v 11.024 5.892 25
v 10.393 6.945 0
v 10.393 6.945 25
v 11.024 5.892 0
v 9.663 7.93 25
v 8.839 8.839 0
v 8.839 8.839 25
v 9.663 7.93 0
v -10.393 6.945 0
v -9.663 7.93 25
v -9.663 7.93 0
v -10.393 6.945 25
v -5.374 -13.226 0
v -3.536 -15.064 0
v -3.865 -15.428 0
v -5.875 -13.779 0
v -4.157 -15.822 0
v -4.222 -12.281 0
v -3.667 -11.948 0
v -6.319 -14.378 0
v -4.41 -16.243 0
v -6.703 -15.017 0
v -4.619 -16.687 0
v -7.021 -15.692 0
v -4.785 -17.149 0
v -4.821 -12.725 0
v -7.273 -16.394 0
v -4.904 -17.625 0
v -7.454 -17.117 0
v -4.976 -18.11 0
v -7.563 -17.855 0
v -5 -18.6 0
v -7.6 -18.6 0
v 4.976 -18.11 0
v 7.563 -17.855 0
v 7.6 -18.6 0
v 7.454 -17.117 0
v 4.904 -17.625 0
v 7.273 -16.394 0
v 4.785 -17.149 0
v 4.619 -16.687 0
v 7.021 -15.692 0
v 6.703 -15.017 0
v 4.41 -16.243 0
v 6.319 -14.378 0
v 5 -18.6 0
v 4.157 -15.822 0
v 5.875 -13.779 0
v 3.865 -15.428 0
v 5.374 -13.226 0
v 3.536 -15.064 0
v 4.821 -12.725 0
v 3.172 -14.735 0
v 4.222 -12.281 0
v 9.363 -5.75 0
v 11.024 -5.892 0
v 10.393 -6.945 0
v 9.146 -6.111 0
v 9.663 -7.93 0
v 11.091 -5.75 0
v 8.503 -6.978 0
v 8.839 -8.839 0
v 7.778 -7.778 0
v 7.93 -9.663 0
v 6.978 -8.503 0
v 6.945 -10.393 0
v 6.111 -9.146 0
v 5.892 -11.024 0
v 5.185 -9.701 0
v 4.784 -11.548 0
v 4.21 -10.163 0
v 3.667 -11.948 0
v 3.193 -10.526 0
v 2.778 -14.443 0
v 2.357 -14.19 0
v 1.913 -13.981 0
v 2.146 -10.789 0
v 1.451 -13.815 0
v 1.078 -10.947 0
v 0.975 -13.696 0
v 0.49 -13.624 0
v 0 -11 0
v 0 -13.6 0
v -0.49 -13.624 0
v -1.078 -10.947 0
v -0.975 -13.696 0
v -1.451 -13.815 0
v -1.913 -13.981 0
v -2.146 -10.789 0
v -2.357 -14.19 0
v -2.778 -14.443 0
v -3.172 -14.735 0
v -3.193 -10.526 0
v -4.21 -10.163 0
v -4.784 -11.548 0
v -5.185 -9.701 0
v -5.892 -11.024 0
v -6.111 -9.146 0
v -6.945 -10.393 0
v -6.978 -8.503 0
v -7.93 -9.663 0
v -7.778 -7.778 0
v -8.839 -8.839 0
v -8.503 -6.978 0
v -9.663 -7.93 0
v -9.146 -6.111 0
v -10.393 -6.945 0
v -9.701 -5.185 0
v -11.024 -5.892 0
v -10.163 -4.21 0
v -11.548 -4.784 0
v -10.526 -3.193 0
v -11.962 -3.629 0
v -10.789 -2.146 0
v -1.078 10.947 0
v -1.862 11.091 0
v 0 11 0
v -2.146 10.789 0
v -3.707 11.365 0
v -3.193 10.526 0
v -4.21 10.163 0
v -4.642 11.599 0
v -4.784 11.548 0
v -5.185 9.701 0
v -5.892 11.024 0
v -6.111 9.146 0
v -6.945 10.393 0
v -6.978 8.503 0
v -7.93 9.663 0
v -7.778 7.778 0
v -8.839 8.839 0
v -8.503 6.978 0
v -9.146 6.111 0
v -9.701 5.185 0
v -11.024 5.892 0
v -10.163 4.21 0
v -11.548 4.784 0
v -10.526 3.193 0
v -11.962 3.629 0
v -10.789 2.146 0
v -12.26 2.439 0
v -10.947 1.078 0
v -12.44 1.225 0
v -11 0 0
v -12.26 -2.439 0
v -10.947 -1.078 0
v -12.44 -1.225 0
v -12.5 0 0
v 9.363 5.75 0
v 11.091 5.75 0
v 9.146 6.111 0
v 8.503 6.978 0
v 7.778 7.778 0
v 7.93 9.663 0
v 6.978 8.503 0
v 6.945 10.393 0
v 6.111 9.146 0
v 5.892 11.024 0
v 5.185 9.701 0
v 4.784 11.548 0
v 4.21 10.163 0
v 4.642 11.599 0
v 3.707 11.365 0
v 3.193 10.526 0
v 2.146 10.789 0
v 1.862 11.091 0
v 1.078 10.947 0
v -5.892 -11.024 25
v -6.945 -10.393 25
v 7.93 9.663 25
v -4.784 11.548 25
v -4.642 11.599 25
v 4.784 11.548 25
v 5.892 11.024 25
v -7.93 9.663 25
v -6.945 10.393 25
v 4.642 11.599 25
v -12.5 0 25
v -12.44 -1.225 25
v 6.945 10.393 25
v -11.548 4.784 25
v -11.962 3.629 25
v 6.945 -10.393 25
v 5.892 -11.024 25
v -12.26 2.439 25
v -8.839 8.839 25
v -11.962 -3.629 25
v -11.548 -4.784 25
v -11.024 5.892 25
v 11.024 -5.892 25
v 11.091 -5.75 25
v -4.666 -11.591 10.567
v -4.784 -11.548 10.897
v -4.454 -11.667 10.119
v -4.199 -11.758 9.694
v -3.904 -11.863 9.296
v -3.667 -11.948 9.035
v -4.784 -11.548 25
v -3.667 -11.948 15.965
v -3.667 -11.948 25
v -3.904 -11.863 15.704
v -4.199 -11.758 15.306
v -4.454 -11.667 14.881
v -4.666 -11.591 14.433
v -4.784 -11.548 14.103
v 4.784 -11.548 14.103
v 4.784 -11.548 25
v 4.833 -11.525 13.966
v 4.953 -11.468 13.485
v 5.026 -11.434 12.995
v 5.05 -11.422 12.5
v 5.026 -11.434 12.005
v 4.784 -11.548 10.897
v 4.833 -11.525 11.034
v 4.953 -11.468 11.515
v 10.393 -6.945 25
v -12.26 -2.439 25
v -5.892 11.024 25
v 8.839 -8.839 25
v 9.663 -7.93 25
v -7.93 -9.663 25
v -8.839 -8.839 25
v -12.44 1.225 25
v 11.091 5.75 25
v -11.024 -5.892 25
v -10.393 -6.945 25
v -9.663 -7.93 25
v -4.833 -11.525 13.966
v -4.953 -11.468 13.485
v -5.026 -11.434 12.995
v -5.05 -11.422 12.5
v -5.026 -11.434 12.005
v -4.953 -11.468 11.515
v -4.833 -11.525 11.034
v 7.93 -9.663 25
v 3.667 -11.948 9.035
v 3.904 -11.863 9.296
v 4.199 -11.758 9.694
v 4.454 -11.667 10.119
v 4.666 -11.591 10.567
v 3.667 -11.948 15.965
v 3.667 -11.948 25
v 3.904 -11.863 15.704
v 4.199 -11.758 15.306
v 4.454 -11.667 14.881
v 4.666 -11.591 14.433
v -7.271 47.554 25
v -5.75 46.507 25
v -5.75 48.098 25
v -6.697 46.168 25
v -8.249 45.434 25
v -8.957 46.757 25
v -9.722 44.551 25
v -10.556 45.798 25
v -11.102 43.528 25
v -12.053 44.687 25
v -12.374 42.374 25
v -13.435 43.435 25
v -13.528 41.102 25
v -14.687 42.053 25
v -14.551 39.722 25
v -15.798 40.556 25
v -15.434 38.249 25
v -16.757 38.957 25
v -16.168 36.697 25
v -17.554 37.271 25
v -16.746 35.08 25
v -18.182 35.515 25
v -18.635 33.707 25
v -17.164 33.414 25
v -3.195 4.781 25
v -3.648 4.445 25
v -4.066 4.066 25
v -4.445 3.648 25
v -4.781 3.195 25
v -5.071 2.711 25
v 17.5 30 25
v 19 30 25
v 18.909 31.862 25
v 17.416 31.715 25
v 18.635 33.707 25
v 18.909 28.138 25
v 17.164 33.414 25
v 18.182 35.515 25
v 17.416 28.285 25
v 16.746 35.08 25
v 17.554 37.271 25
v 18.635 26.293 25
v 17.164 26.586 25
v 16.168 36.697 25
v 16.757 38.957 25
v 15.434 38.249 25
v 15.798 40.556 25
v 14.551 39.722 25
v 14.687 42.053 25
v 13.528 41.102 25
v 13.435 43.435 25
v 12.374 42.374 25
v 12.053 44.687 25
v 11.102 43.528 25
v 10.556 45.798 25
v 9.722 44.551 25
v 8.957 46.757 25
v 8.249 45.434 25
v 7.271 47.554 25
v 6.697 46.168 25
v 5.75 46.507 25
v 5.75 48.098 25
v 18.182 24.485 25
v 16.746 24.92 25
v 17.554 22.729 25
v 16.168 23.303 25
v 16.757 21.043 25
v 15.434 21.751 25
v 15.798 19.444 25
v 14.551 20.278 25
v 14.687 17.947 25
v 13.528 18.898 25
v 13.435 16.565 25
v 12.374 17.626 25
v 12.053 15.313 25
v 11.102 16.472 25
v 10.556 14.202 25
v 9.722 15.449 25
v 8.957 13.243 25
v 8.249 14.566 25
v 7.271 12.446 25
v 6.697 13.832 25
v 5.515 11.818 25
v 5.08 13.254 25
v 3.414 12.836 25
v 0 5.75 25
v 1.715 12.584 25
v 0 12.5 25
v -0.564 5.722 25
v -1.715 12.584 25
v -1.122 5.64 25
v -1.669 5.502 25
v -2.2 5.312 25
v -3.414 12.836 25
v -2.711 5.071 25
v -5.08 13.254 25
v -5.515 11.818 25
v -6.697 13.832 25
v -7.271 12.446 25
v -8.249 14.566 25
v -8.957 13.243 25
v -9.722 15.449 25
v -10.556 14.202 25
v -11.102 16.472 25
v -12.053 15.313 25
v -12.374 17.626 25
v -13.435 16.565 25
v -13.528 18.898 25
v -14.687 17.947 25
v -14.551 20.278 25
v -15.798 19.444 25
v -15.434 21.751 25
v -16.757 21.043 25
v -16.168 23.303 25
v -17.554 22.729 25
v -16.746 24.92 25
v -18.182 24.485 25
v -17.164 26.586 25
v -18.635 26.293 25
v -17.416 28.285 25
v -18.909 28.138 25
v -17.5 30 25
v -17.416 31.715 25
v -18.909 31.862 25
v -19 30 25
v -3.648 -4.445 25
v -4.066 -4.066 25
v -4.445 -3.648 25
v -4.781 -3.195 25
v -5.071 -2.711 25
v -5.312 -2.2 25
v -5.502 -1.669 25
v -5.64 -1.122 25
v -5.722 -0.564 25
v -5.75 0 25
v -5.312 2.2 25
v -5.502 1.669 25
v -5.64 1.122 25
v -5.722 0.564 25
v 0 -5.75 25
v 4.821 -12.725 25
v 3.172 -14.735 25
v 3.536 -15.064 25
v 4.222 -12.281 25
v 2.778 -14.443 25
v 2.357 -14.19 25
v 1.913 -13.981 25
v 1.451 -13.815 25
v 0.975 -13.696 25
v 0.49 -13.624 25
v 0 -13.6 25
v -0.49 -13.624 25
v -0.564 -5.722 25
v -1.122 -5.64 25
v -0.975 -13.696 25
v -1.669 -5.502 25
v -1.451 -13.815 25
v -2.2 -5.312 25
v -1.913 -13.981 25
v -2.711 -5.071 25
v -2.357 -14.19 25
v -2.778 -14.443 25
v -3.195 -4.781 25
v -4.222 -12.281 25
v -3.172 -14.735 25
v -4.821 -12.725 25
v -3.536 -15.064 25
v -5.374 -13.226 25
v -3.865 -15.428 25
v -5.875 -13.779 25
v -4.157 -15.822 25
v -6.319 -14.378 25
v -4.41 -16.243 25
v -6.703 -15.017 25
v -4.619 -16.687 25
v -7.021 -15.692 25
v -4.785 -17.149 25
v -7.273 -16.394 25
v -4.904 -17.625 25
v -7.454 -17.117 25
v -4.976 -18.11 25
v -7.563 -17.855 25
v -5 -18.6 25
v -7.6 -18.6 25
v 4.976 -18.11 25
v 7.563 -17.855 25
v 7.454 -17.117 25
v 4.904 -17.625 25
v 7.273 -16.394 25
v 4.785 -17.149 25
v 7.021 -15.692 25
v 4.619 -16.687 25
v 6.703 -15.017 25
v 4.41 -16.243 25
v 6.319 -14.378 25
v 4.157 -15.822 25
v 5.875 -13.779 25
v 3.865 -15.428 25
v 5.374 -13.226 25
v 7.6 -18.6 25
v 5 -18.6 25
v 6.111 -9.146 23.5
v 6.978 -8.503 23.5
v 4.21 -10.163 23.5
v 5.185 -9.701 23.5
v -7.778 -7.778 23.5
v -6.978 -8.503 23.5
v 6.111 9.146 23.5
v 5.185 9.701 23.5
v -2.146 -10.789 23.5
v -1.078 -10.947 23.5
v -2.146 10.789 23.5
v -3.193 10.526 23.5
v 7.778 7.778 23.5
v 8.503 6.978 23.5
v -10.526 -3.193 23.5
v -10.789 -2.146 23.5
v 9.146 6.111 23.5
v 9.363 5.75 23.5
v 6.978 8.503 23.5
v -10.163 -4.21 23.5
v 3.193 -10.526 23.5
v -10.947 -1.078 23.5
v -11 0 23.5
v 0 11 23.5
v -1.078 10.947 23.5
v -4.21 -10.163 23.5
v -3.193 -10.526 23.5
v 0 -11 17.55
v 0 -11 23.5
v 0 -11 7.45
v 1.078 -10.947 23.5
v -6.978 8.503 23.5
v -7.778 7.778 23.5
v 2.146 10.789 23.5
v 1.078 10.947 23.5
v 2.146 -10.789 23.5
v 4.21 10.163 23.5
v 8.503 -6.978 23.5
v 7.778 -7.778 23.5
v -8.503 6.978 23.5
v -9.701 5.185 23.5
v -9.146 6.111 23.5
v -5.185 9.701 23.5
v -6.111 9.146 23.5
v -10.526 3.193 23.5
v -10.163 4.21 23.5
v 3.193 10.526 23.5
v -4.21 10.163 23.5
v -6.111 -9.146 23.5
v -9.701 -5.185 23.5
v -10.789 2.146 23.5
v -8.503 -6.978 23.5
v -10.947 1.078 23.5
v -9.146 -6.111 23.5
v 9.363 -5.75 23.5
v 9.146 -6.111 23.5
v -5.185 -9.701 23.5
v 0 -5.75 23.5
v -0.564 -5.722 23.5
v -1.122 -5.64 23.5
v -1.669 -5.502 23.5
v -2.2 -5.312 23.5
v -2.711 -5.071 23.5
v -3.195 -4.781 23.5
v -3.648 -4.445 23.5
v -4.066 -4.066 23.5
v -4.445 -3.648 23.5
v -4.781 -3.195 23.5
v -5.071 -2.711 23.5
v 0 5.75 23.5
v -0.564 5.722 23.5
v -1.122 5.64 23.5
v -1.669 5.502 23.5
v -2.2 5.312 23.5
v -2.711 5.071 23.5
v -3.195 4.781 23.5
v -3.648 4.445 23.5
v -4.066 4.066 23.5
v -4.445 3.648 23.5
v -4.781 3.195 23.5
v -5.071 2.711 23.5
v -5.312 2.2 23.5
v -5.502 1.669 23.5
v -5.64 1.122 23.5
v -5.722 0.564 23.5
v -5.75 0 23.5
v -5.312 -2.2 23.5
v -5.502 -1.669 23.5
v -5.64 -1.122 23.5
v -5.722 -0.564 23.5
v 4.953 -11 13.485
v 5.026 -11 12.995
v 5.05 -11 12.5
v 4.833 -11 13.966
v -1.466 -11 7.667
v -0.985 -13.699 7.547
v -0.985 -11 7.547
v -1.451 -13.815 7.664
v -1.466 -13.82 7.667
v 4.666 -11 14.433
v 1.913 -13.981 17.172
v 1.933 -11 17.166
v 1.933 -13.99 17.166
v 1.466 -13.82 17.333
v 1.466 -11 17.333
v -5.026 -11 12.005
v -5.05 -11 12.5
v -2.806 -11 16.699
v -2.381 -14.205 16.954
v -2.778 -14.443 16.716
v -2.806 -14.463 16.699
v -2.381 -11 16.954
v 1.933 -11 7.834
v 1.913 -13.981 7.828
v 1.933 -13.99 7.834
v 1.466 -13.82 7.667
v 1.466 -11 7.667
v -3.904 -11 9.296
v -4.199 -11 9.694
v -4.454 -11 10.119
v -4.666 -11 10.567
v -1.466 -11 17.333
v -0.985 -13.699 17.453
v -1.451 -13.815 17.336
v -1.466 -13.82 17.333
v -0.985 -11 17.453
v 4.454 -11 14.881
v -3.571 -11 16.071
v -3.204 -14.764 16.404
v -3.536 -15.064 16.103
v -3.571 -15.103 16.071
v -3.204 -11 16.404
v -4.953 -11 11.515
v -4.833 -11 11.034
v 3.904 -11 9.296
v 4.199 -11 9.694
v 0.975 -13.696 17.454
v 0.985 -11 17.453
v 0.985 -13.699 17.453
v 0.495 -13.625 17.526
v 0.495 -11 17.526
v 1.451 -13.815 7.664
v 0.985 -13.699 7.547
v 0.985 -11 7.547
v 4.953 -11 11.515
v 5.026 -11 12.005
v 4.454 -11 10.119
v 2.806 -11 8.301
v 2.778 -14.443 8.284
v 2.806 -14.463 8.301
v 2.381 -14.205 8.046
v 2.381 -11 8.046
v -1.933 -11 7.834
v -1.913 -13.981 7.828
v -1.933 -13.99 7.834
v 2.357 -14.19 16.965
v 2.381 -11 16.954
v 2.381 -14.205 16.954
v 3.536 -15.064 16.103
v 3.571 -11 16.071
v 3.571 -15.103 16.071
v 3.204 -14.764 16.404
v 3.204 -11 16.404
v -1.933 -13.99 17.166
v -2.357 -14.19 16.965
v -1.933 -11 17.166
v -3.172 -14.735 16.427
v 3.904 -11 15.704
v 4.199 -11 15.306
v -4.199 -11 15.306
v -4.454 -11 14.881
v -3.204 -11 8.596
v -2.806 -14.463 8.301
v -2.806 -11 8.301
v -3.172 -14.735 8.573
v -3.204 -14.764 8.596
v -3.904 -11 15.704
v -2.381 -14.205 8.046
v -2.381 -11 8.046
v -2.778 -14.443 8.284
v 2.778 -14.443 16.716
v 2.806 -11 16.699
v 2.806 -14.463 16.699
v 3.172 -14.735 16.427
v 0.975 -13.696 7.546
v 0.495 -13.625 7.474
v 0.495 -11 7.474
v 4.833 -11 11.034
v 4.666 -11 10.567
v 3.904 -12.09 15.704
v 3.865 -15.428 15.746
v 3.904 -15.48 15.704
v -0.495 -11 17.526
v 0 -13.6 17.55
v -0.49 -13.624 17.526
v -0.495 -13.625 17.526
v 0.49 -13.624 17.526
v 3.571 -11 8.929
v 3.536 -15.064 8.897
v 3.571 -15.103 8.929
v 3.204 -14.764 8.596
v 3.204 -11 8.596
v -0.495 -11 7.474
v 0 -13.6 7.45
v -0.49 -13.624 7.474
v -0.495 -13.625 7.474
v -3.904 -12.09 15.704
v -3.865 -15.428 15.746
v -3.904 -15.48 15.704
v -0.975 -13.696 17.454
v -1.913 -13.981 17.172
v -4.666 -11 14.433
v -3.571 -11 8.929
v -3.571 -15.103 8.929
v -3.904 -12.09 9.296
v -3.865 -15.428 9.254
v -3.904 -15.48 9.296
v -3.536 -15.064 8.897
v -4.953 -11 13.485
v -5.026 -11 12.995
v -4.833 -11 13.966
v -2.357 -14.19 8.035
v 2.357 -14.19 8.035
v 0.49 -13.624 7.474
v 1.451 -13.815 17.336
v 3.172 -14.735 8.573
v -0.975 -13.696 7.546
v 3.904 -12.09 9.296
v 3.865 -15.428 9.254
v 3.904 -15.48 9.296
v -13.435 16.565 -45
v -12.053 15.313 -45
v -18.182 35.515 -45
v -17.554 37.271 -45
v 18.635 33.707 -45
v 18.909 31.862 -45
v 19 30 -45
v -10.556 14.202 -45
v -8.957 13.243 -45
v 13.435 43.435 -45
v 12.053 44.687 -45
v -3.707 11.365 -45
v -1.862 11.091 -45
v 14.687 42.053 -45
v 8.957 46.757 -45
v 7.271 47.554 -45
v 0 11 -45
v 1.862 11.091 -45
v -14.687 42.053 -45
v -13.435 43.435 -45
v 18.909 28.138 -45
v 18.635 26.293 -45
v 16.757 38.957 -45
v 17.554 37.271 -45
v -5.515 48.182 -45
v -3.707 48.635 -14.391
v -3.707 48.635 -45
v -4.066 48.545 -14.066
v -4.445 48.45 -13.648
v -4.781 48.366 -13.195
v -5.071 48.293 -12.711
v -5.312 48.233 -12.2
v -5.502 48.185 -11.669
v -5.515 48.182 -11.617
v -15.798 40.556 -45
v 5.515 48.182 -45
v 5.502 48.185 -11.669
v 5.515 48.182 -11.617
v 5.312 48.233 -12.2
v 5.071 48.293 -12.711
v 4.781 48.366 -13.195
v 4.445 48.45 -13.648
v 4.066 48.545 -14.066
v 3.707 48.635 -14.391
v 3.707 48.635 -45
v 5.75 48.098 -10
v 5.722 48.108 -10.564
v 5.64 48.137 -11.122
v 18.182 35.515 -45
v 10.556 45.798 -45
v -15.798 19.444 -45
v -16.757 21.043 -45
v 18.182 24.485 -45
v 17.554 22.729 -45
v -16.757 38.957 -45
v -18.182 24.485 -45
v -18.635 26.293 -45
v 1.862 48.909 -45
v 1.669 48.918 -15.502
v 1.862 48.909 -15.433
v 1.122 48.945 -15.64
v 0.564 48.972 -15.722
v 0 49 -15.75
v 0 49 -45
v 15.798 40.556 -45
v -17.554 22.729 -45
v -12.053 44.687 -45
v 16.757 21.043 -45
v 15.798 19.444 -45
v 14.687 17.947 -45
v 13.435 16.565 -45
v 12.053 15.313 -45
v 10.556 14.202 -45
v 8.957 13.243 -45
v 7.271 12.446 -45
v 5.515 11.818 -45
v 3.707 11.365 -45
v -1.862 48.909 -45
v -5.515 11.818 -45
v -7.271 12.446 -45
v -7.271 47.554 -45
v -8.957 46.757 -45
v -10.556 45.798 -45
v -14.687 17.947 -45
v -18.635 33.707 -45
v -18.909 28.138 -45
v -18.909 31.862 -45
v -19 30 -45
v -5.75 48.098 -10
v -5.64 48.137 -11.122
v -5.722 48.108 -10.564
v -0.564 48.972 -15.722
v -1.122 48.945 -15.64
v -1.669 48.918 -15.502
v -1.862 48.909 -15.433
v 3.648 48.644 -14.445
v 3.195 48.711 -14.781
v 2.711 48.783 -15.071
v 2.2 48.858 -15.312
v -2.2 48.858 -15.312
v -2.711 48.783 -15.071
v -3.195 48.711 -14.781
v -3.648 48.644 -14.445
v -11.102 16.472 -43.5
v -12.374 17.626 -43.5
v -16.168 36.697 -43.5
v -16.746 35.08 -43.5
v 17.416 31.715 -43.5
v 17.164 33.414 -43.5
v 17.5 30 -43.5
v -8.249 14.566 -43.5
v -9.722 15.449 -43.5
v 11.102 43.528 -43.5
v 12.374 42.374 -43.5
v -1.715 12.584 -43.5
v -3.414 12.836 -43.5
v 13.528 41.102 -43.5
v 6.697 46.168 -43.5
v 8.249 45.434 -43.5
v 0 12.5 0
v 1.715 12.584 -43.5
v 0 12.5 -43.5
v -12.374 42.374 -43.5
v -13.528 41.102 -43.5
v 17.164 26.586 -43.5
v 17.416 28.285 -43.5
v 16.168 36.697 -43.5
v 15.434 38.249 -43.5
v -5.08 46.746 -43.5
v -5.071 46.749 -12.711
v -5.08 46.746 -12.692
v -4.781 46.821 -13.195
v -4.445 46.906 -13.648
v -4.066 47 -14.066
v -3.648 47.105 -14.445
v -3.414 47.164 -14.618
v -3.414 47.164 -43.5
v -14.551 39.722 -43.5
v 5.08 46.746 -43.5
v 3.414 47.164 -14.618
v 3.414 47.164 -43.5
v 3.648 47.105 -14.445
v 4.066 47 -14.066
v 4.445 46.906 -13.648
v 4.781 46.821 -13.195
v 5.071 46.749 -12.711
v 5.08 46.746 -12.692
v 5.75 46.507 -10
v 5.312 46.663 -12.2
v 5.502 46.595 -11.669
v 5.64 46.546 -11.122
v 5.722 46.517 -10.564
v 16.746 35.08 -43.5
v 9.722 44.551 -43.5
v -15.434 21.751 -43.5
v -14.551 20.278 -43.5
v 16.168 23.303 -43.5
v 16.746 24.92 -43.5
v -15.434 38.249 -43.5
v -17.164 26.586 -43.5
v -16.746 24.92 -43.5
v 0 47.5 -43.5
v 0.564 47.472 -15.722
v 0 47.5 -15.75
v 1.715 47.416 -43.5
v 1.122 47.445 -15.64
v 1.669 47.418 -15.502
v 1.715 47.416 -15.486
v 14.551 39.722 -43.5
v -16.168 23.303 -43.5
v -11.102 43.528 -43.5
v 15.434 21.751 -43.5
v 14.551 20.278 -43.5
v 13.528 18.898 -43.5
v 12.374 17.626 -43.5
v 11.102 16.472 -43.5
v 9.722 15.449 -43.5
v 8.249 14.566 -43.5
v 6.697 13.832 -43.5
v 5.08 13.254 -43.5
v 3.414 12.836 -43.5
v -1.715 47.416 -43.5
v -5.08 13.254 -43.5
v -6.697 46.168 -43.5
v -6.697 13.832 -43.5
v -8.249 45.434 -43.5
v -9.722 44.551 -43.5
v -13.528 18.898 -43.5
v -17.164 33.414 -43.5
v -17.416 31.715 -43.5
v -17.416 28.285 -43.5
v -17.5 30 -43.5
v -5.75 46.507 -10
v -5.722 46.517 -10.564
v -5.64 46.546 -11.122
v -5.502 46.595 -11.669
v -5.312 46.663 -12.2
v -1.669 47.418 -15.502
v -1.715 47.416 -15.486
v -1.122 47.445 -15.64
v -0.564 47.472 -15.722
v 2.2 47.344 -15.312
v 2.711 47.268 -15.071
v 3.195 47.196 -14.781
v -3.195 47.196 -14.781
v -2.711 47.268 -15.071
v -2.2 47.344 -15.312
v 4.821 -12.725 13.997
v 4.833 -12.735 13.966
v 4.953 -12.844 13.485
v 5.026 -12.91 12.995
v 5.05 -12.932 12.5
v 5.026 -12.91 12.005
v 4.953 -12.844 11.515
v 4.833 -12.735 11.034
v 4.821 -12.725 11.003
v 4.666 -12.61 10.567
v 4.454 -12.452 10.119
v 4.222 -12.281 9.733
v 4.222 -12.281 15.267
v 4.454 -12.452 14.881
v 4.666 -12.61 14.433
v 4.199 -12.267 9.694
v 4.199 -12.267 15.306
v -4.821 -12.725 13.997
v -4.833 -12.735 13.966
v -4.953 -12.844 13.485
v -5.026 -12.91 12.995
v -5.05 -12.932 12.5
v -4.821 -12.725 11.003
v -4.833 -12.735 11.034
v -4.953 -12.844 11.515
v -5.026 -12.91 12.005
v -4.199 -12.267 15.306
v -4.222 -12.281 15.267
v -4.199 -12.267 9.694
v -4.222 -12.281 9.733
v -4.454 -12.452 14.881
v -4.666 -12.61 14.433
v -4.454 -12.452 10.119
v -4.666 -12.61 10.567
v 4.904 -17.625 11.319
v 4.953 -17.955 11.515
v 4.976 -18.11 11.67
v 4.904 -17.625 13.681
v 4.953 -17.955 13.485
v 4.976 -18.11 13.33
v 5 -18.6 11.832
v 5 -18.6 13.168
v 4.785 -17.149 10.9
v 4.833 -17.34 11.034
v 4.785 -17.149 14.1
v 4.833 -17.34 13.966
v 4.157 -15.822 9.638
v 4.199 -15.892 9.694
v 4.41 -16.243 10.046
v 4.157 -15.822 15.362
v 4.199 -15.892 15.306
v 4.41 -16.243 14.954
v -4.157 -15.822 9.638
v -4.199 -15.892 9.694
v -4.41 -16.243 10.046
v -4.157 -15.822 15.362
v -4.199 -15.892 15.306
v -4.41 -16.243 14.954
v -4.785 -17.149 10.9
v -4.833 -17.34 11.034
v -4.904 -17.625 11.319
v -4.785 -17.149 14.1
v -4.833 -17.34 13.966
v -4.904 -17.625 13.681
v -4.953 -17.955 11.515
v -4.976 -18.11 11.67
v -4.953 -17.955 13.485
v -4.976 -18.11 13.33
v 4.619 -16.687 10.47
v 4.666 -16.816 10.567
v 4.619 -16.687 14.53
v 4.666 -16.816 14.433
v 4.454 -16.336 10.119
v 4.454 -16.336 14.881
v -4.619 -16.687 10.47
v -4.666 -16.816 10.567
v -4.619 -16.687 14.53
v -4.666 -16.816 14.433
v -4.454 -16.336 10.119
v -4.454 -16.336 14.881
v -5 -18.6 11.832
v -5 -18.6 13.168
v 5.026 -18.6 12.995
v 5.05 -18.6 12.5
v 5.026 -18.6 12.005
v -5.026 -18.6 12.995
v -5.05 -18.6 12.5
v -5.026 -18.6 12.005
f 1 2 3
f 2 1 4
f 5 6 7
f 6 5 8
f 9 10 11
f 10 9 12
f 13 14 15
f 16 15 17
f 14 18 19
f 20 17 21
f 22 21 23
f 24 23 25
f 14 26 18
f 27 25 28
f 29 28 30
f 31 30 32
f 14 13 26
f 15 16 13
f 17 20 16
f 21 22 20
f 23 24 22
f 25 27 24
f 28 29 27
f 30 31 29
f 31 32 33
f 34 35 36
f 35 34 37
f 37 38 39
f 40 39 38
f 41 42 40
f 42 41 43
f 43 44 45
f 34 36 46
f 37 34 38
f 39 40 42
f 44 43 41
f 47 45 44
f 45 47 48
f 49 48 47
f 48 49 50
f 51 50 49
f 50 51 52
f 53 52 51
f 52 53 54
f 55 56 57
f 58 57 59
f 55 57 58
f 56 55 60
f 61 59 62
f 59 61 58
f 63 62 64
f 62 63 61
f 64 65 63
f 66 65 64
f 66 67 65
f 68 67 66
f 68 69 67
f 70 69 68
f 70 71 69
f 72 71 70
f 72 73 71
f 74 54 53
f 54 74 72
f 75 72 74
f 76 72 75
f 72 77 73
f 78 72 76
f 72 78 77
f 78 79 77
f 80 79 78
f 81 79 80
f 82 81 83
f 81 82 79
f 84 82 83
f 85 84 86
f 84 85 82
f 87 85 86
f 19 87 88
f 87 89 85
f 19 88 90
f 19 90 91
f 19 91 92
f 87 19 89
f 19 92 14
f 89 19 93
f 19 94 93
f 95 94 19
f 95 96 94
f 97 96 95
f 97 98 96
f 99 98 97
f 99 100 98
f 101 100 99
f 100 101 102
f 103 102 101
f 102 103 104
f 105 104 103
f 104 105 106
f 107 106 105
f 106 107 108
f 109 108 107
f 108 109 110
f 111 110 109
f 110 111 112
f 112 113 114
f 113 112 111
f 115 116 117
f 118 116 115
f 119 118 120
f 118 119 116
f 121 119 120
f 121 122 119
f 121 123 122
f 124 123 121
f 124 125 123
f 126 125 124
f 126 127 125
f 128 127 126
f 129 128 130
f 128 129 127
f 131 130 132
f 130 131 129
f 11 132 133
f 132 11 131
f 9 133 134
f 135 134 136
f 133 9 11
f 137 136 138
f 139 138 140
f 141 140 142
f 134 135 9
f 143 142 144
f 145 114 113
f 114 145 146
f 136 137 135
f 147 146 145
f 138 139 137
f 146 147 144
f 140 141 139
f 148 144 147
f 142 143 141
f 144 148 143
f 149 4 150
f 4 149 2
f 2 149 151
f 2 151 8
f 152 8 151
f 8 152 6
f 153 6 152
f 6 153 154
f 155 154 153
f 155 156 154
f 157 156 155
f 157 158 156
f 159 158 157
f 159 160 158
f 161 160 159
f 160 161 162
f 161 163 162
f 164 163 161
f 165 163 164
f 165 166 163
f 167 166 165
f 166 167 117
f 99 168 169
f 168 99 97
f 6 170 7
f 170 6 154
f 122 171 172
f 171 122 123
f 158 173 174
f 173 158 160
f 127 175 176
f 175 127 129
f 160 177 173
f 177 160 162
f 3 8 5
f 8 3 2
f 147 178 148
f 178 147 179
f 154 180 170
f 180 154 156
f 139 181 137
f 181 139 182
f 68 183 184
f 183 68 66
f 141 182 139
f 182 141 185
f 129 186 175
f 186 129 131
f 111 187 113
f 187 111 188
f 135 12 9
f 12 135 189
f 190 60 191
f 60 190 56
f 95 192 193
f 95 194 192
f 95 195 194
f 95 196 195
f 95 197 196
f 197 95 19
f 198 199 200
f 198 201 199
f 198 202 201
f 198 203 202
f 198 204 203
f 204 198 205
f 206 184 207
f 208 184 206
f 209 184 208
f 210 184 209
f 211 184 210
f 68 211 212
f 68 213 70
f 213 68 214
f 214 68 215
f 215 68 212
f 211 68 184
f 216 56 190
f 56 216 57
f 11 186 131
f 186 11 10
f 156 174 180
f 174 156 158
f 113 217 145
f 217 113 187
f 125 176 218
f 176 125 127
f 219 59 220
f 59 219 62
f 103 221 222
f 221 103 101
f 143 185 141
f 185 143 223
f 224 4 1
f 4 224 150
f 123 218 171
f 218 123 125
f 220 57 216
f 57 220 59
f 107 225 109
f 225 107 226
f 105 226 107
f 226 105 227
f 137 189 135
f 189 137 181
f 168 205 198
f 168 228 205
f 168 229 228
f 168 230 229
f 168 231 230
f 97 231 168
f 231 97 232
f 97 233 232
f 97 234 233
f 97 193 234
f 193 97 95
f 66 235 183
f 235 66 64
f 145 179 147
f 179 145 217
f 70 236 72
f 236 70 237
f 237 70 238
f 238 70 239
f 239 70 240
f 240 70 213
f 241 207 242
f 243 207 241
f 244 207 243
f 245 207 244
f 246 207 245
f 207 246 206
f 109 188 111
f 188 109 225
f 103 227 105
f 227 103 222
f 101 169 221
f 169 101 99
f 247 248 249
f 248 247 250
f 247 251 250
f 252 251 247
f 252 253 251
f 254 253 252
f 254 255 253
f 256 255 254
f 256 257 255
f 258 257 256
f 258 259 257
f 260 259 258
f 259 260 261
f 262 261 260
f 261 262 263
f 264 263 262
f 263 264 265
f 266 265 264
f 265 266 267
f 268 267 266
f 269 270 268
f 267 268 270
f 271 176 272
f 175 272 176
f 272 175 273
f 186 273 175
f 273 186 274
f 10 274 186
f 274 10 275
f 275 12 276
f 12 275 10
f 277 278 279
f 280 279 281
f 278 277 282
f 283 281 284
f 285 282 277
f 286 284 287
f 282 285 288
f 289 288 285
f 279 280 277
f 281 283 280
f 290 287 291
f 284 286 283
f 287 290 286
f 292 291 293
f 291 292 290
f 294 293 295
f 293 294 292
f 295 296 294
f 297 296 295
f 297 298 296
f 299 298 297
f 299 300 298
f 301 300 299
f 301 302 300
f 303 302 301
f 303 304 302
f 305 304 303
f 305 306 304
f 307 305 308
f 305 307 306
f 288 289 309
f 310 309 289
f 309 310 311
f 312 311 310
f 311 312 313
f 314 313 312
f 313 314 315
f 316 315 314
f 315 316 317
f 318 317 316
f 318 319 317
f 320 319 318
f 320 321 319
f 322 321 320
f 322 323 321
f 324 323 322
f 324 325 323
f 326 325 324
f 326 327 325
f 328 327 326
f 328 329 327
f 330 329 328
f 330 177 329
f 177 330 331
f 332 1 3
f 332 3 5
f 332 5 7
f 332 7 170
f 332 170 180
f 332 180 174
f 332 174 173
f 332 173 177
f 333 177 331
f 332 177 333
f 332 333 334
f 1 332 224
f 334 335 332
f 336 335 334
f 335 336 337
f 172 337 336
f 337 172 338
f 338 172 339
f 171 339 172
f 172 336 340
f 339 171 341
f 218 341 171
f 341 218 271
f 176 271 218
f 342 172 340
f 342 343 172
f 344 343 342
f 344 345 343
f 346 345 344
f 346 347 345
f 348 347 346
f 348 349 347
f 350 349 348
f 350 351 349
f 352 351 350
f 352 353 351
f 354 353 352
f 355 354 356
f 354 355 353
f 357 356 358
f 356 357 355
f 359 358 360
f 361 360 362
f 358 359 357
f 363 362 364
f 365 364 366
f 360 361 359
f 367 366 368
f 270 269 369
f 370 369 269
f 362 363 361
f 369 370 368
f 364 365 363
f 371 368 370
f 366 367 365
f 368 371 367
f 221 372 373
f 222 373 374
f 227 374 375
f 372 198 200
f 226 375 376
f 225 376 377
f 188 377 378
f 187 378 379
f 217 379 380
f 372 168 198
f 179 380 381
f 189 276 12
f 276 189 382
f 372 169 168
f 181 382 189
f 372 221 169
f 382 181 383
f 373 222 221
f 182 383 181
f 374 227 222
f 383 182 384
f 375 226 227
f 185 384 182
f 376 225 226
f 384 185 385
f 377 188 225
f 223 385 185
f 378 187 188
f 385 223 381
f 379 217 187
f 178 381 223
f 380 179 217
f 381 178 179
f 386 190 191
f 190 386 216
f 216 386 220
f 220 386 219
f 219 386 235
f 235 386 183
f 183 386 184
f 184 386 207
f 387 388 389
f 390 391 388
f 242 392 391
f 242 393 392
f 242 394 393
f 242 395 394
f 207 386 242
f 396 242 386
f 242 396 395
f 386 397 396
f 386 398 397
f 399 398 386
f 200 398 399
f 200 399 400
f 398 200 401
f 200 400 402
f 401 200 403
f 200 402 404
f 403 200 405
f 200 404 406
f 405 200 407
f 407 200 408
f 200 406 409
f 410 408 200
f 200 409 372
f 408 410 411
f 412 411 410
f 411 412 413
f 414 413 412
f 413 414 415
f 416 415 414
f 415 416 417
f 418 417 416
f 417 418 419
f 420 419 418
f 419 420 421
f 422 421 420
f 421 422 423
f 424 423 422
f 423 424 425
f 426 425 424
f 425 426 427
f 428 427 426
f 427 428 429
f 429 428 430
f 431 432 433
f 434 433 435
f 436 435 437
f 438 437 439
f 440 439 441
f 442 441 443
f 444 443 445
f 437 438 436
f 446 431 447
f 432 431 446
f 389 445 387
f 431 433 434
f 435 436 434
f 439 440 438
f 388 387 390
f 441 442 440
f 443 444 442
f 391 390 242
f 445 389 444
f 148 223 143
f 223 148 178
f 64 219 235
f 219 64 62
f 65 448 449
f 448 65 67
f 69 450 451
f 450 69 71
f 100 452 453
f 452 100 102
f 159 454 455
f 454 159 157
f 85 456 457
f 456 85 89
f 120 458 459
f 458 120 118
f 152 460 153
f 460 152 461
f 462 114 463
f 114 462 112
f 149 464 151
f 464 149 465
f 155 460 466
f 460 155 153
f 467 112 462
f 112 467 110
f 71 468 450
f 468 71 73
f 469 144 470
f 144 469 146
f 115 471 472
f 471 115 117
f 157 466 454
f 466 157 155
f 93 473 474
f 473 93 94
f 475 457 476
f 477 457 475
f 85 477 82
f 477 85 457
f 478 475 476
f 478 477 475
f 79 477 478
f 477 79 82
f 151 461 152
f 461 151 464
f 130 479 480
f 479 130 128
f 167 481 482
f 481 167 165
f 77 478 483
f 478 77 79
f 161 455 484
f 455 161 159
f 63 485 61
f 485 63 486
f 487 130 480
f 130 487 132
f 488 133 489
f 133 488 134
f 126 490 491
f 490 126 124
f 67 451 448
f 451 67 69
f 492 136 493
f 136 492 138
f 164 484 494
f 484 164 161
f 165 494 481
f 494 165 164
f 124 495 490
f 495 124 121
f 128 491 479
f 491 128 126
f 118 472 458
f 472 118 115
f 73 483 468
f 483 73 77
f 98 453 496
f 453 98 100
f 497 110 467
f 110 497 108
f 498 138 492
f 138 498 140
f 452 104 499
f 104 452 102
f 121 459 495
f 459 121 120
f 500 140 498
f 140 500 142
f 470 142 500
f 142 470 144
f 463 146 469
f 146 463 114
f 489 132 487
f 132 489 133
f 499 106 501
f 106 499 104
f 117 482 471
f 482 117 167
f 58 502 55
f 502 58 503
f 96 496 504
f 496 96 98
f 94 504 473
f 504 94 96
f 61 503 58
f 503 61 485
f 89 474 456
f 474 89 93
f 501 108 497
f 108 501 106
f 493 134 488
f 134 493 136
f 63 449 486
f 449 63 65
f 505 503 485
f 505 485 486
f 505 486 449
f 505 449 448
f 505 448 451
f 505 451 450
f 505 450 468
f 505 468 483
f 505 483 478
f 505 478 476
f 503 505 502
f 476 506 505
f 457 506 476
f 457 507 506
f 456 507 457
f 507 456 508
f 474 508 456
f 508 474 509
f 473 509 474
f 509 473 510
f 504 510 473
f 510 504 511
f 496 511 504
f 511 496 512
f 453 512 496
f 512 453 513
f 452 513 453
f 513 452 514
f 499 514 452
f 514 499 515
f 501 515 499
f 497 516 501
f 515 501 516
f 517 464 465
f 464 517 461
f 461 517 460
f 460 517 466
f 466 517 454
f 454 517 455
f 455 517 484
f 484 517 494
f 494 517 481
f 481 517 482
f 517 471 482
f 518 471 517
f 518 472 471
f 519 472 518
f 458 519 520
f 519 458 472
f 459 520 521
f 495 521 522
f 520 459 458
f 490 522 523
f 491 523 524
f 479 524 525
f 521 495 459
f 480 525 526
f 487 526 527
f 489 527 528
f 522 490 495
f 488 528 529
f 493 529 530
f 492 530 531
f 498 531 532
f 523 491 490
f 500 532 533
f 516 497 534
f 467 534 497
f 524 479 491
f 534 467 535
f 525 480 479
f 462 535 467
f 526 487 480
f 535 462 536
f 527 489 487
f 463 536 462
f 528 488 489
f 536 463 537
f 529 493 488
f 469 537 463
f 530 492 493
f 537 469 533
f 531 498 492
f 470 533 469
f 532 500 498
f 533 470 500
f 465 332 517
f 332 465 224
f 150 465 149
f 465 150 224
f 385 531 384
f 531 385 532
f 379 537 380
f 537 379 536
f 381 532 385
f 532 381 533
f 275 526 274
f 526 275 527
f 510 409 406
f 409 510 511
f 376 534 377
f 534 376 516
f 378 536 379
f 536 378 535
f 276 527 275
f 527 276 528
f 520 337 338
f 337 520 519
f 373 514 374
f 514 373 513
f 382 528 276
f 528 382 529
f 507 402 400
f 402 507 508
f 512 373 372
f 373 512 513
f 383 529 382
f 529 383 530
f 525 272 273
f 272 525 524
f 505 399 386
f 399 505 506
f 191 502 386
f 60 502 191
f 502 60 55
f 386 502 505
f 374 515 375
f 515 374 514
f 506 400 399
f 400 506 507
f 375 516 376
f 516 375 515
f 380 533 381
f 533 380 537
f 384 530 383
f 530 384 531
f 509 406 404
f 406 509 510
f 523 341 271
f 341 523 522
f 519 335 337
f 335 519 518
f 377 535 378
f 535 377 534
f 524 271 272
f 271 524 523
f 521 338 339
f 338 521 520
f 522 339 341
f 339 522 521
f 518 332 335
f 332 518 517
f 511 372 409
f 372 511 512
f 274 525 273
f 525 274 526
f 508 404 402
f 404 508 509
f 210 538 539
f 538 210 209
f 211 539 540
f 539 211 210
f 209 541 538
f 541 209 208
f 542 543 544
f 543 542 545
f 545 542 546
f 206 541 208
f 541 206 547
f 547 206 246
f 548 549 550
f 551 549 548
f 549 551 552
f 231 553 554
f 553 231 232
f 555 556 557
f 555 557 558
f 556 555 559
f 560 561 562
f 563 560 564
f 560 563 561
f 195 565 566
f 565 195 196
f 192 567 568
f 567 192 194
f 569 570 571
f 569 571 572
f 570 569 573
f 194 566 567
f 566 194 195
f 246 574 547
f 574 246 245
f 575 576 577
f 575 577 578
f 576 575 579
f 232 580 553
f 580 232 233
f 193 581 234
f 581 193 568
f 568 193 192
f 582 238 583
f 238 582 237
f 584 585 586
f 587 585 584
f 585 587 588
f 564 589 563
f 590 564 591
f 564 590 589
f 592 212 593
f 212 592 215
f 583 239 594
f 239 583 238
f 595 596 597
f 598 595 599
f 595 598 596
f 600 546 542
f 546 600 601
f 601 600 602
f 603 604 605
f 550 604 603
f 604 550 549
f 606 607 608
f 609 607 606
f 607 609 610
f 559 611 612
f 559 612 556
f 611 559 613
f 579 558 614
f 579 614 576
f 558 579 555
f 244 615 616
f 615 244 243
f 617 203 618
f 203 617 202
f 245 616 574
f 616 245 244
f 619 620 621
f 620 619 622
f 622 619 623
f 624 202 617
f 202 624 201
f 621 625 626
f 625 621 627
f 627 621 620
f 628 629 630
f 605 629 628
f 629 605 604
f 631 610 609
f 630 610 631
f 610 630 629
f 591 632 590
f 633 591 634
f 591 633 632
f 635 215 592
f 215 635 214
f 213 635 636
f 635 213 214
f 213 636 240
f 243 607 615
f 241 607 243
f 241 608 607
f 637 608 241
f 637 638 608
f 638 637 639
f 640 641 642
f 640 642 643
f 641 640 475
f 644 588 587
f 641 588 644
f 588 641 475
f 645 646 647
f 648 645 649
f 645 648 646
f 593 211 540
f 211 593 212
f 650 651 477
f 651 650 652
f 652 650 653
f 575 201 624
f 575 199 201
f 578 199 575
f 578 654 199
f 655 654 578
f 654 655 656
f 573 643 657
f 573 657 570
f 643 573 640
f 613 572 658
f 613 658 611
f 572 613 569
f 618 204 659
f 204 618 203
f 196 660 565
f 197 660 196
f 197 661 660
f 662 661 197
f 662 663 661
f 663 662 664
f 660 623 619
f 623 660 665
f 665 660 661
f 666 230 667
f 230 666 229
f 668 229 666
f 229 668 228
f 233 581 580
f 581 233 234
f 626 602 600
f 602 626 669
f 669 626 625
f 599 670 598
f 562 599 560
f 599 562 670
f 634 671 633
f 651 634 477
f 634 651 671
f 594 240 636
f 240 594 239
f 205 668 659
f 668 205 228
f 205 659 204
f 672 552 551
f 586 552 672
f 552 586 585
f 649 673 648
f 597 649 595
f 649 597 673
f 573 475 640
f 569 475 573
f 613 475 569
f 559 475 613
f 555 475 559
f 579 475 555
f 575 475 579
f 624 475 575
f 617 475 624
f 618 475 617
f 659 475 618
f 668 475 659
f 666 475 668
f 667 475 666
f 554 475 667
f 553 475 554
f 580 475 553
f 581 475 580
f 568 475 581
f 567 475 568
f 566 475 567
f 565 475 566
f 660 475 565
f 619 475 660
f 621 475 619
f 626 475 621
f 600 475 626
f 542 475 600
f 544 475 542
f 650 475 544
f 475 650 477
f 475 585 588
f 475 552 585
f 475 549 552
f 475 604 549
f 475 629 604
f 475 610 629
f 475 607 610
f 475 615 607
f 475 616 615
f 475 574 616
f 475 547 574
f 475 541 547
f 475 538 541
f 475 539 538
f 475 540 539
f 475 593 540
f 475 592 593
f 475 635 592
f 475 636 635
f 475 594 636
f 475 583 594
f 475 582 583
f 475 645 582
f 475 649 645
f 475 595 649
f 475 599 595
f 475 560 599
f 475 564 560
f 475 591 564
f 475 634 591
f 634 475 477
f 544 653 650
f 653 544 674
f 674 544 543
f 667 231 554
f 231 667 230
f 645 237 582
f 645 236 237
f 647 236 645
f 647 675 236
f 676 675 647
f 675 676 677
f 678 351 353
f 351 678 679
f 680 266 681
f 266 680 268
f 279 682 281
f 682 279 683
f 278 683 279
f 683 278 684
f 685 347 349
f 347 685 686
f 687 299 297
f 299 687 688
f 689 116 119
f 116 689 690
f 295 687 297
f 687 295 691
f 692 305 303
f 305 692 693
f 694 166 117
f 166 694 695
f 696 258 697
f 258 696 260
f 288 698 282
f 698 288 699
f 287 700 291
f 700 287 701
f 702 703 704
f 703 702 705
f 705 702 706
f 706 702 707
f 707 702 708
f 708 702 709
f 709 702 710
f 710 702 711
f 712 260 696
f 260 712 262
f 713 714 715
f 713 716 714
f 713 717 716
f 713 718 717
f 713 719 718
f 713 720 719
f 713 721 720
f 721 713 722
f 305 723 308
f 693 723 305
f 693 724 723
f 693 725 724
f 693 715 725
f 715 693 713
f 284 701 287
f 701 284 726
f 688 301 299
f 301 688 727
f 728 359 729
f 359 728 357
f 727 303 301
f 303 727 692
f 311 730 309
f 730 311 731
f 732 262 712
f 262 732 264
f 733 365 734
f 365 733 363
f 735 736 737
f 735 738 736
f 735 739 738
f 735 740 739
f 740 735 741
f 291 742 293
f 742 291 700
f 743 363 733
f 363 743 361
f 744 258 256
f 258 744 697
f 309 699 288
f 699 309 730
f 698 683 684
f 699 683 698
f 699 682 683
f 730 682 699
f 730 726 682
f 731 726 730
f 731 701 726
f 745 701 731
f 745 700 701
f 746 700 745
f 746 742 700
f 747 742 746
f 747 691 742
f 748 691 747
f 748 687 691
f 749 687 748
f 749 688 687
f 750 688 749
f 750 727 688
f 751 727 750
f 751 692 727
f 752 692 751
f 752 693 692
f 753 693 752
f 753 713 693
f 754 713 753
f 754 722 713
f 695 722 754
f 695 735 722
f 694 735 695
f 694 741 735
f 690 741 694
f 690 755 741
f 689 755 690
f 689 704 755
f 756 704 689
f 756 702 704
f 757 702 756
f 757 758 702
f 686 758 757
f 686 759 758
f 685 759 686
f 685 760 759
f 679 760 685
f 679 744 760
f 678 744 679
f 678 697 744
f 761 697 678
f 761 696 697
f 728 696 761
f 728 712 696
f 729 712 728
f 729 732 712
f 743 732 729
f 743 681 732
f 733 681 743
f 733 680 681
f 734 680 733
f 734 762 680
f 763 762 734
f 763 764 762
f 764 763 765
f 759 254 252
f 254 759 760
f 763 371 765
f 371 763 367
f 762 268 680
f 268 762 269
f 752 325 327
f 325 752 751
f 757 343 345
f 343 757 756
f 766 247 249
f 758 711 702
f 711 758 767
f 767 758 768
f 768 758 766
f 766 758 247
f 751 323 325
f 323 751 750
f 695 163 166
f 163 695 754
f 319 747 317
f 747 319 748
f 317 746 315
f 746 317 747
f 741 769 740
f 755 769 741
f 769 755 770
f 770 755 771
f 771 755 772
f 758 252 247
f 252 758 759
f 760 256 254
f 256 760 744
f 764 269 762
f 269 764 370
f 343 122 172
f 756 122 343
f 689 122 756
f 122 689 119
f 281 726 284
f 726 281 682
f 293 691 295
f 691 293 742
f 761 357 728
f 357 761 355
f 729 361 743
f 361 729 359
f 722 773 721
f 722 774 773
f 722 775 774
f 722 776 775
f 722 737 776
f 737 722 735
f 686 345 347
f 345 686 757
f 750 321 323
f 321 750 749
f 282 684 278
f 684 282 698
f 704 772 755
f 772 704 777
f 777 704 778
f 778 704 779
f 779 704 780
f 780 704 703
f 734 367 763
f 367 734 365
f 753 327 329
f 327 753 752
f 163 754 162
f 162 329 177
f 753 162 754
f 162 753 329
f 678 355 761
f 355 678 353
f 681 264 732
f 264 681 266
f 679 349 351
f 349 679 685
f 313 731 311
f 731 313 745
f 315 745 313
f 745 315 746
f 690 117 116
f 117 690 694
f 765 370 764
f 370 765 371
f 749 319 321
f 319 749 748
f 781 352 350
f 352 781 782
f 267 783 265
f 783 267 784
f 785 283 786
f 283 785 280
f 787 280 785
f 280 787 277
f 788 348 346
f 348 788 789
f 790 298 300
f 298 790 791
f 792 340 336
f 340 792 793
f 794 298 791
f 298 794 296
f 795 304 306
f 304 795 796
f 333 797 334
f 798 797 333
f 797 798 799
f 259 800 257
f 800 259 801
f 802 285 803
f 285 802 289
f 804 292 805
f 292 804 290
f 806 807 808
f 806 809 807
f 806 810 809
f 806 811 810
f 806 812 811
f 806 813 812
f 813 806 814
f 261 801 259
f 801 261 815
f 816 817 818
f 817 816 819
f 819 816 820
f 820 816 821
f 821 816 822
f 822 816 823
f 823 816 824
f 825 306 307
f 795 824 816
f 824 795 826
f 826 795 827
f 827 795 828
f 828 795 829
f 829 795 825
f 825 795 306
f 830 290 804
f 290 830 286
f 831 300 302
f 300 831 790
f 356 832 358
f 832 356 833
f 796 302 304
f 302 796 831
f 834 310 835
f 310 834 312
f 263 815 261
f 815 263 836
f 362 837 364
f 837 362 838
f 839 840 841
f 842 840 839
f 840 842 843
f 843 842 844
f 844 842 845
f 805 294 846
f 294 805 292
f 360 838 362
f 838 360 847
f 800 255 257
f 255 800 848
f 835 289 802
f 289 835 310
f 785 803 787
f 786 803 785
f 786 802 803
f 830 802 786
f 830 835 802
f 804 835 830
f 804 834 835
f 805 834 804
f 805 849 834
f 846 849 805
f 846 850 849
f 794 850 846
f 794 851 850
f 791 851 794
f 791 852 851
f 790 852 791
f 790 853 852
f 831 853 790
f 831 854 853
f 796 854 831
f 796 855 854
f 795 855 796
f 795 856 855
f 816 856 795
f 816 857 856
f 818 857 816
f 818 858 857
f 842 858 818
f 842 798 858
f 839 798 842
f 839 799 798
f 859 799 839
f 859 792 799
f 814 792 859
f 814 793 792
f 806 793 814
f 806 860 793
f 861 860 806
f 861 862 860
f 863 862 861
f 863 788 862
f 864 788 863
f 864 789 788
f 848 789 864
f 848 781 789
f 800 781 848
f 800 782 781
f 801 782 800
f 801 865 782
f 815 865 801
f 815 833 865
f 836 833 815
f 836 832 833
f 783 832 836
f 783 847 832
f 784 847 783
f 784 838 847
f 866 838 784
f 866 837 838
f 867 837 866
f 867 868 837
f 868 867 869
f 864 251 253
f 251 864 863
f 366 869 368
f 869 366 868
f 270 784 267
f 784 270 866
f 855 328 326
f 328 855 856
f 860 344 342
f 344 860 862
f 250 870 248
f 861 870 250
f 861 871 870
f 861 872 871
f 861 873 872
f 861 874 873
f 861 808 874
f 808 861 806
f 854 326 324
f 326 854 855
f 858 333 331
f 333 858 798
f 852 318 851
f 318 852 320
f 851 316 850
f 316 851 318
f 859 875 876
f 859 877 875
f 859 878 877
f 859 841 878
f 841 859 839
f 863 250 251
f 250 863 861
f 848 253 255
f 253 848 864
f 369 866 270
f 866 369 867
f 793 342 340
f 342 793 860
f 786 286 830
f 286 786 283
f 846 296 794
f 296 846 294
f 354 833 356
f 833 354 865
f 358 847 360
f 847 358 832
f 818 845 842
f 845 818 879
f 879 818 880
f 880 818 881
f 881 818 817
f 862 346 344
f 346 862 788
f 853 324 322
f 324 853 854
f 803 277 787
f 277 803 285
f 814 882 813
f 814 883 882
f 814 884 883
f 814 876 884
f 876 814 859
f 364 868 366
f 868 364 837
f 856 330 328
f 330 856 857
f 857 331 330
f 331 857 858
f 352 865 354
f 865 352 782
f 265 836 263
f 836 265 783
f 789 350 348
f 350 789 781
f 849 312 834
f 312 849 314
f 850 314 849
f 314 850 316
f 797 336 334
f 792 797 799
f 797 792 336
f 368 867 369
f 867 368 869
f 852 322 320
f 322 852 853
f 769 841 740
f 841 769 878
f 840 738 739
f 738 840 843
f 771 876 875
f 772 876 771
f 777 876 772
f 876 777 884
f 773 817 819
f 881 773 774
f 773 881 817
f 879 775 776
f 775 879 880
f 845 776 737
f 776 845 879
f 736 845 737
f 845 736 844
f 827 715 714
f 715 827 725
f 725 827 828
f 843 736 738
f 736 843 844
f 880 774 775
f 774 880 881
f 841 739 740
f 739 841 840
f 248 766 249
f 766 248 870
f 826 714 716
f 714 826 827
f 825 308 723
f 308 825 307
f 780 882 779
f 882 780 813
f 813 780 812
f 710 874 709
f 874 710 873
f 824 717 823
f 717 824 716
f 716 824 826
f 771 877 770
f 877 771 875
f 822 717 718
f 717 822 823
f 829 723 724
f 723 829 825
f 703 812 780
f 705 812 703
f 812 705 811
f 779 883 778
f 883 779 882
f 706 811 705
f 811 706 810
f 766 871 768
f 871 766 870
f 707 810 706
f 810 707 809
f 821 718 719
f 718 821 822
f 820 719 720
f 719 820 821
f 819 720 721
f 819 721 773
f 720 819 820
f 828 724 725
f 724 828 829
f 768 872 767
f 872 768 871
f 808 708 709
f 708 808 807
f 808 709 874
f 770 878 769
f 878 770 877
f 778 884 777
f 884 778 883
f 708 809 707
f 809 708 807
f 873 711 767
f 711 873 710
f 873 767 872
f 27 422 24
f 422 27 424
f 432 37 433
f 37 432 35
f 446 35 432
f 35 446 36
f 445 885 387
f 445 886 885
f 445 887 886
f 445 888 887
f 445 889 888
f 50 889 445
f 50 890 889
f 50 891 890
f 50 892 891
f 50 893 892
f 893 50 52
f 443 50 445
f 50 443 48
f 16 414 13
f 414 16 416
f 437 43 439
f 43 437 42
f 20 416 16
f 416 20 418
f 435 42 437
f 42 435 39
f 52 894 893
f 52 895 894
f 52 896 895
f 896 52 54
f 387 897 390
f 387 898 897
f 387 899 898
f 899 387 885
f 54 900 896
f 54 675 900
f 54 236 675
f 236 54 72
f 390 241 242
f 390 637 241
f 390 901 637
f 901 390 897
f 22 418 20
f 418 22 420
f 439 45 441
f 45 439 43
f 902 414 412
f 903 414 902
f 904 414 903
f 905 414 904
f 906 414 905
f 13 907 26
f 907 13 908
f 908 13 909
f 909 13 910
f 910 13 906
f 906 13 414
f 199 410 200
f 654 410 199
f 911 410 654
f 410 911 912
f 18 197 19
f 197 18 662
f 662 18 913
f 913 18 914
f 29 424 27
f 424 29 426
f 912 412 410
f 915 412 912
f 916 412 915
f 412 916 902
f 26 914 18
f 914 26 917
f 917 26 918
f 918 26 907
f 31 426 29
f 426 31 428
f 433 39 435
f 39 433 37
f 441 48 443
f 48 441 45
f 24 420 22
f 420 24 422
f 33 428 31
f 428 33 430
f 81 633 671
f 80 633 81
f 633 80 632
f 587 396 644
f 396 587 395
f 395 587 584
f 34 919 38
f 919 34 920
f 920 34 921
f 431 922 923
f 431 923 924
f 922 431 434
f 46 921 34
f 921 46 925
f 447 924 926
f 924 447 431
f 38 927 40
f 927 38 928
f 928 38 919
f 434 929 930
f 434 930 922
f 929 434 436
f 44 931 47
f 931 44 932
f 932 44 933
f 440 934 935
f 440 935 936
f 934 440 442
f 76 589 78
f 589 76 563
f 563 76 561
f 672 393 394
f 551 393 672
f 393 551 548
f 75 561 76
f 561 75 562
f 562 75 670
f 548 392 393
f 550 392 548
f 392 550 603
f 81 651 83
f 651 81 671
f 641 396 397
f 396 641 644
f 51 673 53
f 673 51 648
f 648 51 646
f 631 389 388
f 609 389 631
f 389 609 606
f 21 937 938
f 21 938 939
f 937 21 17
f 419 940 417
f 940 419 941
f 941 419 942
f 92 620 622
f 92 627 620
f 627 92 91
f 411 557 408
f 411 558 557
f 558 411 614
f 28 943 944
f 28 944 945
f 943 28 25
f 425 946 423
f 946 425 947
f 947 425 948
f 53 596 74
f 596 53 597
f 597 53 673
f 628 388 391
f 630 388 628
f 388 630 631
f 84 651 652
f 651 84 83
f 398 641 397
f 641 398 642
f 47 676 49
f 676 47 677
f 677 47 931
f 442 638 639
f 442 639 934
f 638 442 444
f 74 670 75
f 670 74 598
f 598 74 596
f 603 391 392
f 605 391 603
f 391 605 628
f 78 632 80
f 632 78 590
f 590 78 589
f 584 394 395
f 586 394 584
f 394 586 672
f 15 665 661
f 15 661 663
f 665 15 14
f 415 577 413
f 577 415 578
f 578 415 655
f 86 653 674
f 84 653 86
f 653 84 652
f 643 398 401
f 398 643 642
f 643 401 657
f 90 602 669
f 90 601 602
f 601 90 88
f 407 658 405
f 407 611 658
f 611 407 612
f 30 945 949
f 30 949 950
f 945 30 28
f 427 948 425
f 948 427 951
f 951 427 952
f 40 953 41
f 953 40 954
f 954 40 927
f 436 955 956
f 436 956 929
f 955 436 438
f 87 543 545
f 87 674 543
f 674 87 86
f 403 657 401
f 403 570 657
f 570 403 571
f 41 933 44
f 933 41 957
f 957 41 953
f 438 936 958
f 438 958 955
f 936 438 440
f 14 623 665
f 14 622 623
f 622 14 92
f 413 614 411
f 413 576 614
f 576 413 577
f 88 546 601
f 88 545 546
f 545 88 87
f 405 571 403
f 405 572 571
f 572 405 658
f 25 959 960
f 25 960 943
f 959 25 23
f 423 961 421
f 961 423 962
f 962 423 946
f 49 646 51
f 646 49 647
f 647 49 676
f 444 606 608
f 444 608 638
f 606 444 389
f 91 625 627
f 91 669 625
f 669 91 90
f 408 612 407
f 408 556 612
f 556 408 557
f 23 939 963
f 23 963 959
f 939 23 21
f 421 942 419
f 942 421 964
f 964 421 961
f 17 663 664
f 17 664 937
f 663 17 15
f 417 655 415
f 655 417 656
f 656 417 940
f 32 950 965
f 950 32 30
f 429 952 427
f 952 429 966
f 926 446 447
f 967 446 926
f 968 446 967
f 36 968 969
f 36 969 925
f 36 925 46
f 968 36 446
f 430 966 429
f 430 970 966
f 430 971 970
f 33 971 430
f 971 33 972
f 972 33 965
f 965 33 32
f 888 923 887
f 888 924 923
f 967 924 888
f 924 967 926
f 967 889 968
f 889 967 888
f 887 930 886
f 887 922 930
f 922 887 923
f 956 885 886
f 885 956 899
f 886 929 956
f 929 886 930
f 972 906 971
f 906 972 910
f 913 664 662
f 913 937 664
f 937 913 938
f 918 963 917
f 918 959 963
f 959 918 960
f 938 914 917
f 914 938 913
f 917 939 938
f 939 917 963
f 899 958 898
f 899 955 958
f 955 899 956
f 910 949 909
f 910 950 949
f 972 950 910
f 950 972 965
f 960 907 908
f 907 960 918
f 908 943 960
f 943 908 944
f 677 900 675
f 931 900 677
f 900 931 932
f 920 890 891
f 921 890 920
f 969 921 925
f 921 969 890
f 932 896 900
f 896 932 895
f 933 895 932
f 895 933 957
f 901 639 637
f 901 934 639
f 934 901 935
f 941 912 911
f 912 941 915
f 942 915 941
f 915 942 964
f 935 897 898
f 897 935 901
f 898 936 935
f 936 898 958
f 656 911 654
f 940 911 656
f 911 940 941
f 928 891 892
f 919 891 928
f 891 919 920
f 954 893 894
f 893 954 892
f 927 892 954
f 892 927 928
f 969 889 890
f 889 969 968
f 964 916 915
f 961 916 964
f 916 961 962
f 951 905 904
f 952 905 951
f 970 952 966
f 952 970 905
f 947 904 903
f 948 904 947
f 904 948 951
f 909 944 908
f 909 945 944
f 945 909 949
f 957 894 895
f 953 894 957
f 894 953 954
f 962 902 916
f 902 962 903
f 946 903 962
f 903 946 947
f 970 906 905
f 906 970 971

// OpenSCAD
$fn = 64;

wall_thickness = 1.5;

// core
core_h = 25;
core_id = 22;
core_od = core_id + wall_thickness * 2;
core_slot_w = 11.5;

difference() {
  cylinder(core_h, d = core_od);
  translate([0, 0, -wall_thickness]) {
    cylinder(core_h, d = core_id);
  }
  translate([0, 0, -1]) {
    rotate([0, 0, 0]) {
      hull() {
        cylinder(core_h + 2, d = core_slot_w);
        translate([0, -core_slot_w / 2, 0]) {
          cube([core_od / 2, core_slot_w, core_h + 2]);
        }
      }
    }
  }

  translate([0, -(core_id / 2 + pen_od / 2), core_h - pen_h ]) { 
    magnet();
  }
}

// sprayholder
spray_h = 70;
spray_id = 35;
spray_od = spray_id + wall_thickness * 2;

translate([0, core_id / 2 + spray_od / 2, core_h - spray_h ]) { 
  difference() {
    cylinder(spray_h, d = spray_od);
    translate([0, 0, wall_thickness]) {
      cylinder(spray_h, d = spray_id);
    }
    translate([0, spray_od / 2, spray_h / 2]) {
      rotate([0, -90, 90]) {
        hull() {
          cylinder(spray_od / 2, d = core_slot_w);
          translate([0, -core_slot_w / 2, 0]) {
            cube([spray_h, core_slot_w, spray_od / 2]);
          }
        }
      }
    }
  }
}

// Magnet
module magnet() {
  translate([0, pen_id / 2 + magnet_thickness, pen_h / 2]) {
    rotate([90, 0, 0]) {
      cylinder(magnet_thickness * 3, d = magnet_d);
    }
  }
}

// Penholder
magnet_d = 10.1;
magnet_thickness = 2.6;
pen_h = core_h;
pen_id = 10;
pen_od = pen_id + magnet_thickness * 2;

translate([0, -(core_id / 2 + pen_od / 2), core_h - pen_h ]) { 
  difference() {
    cylinder(pen_h, d = pen_od);
    translate([0, 0, -1]) {
      cylinder(pen_h + 2, d = pen_id);
    }
    translate([-pen_od / 2 - 1, -pen_od - 2, -1]) {
      cube([pen_od + 2, pen_od + 2, pen_h + 2]);
    }
    magnet();
  }
}
